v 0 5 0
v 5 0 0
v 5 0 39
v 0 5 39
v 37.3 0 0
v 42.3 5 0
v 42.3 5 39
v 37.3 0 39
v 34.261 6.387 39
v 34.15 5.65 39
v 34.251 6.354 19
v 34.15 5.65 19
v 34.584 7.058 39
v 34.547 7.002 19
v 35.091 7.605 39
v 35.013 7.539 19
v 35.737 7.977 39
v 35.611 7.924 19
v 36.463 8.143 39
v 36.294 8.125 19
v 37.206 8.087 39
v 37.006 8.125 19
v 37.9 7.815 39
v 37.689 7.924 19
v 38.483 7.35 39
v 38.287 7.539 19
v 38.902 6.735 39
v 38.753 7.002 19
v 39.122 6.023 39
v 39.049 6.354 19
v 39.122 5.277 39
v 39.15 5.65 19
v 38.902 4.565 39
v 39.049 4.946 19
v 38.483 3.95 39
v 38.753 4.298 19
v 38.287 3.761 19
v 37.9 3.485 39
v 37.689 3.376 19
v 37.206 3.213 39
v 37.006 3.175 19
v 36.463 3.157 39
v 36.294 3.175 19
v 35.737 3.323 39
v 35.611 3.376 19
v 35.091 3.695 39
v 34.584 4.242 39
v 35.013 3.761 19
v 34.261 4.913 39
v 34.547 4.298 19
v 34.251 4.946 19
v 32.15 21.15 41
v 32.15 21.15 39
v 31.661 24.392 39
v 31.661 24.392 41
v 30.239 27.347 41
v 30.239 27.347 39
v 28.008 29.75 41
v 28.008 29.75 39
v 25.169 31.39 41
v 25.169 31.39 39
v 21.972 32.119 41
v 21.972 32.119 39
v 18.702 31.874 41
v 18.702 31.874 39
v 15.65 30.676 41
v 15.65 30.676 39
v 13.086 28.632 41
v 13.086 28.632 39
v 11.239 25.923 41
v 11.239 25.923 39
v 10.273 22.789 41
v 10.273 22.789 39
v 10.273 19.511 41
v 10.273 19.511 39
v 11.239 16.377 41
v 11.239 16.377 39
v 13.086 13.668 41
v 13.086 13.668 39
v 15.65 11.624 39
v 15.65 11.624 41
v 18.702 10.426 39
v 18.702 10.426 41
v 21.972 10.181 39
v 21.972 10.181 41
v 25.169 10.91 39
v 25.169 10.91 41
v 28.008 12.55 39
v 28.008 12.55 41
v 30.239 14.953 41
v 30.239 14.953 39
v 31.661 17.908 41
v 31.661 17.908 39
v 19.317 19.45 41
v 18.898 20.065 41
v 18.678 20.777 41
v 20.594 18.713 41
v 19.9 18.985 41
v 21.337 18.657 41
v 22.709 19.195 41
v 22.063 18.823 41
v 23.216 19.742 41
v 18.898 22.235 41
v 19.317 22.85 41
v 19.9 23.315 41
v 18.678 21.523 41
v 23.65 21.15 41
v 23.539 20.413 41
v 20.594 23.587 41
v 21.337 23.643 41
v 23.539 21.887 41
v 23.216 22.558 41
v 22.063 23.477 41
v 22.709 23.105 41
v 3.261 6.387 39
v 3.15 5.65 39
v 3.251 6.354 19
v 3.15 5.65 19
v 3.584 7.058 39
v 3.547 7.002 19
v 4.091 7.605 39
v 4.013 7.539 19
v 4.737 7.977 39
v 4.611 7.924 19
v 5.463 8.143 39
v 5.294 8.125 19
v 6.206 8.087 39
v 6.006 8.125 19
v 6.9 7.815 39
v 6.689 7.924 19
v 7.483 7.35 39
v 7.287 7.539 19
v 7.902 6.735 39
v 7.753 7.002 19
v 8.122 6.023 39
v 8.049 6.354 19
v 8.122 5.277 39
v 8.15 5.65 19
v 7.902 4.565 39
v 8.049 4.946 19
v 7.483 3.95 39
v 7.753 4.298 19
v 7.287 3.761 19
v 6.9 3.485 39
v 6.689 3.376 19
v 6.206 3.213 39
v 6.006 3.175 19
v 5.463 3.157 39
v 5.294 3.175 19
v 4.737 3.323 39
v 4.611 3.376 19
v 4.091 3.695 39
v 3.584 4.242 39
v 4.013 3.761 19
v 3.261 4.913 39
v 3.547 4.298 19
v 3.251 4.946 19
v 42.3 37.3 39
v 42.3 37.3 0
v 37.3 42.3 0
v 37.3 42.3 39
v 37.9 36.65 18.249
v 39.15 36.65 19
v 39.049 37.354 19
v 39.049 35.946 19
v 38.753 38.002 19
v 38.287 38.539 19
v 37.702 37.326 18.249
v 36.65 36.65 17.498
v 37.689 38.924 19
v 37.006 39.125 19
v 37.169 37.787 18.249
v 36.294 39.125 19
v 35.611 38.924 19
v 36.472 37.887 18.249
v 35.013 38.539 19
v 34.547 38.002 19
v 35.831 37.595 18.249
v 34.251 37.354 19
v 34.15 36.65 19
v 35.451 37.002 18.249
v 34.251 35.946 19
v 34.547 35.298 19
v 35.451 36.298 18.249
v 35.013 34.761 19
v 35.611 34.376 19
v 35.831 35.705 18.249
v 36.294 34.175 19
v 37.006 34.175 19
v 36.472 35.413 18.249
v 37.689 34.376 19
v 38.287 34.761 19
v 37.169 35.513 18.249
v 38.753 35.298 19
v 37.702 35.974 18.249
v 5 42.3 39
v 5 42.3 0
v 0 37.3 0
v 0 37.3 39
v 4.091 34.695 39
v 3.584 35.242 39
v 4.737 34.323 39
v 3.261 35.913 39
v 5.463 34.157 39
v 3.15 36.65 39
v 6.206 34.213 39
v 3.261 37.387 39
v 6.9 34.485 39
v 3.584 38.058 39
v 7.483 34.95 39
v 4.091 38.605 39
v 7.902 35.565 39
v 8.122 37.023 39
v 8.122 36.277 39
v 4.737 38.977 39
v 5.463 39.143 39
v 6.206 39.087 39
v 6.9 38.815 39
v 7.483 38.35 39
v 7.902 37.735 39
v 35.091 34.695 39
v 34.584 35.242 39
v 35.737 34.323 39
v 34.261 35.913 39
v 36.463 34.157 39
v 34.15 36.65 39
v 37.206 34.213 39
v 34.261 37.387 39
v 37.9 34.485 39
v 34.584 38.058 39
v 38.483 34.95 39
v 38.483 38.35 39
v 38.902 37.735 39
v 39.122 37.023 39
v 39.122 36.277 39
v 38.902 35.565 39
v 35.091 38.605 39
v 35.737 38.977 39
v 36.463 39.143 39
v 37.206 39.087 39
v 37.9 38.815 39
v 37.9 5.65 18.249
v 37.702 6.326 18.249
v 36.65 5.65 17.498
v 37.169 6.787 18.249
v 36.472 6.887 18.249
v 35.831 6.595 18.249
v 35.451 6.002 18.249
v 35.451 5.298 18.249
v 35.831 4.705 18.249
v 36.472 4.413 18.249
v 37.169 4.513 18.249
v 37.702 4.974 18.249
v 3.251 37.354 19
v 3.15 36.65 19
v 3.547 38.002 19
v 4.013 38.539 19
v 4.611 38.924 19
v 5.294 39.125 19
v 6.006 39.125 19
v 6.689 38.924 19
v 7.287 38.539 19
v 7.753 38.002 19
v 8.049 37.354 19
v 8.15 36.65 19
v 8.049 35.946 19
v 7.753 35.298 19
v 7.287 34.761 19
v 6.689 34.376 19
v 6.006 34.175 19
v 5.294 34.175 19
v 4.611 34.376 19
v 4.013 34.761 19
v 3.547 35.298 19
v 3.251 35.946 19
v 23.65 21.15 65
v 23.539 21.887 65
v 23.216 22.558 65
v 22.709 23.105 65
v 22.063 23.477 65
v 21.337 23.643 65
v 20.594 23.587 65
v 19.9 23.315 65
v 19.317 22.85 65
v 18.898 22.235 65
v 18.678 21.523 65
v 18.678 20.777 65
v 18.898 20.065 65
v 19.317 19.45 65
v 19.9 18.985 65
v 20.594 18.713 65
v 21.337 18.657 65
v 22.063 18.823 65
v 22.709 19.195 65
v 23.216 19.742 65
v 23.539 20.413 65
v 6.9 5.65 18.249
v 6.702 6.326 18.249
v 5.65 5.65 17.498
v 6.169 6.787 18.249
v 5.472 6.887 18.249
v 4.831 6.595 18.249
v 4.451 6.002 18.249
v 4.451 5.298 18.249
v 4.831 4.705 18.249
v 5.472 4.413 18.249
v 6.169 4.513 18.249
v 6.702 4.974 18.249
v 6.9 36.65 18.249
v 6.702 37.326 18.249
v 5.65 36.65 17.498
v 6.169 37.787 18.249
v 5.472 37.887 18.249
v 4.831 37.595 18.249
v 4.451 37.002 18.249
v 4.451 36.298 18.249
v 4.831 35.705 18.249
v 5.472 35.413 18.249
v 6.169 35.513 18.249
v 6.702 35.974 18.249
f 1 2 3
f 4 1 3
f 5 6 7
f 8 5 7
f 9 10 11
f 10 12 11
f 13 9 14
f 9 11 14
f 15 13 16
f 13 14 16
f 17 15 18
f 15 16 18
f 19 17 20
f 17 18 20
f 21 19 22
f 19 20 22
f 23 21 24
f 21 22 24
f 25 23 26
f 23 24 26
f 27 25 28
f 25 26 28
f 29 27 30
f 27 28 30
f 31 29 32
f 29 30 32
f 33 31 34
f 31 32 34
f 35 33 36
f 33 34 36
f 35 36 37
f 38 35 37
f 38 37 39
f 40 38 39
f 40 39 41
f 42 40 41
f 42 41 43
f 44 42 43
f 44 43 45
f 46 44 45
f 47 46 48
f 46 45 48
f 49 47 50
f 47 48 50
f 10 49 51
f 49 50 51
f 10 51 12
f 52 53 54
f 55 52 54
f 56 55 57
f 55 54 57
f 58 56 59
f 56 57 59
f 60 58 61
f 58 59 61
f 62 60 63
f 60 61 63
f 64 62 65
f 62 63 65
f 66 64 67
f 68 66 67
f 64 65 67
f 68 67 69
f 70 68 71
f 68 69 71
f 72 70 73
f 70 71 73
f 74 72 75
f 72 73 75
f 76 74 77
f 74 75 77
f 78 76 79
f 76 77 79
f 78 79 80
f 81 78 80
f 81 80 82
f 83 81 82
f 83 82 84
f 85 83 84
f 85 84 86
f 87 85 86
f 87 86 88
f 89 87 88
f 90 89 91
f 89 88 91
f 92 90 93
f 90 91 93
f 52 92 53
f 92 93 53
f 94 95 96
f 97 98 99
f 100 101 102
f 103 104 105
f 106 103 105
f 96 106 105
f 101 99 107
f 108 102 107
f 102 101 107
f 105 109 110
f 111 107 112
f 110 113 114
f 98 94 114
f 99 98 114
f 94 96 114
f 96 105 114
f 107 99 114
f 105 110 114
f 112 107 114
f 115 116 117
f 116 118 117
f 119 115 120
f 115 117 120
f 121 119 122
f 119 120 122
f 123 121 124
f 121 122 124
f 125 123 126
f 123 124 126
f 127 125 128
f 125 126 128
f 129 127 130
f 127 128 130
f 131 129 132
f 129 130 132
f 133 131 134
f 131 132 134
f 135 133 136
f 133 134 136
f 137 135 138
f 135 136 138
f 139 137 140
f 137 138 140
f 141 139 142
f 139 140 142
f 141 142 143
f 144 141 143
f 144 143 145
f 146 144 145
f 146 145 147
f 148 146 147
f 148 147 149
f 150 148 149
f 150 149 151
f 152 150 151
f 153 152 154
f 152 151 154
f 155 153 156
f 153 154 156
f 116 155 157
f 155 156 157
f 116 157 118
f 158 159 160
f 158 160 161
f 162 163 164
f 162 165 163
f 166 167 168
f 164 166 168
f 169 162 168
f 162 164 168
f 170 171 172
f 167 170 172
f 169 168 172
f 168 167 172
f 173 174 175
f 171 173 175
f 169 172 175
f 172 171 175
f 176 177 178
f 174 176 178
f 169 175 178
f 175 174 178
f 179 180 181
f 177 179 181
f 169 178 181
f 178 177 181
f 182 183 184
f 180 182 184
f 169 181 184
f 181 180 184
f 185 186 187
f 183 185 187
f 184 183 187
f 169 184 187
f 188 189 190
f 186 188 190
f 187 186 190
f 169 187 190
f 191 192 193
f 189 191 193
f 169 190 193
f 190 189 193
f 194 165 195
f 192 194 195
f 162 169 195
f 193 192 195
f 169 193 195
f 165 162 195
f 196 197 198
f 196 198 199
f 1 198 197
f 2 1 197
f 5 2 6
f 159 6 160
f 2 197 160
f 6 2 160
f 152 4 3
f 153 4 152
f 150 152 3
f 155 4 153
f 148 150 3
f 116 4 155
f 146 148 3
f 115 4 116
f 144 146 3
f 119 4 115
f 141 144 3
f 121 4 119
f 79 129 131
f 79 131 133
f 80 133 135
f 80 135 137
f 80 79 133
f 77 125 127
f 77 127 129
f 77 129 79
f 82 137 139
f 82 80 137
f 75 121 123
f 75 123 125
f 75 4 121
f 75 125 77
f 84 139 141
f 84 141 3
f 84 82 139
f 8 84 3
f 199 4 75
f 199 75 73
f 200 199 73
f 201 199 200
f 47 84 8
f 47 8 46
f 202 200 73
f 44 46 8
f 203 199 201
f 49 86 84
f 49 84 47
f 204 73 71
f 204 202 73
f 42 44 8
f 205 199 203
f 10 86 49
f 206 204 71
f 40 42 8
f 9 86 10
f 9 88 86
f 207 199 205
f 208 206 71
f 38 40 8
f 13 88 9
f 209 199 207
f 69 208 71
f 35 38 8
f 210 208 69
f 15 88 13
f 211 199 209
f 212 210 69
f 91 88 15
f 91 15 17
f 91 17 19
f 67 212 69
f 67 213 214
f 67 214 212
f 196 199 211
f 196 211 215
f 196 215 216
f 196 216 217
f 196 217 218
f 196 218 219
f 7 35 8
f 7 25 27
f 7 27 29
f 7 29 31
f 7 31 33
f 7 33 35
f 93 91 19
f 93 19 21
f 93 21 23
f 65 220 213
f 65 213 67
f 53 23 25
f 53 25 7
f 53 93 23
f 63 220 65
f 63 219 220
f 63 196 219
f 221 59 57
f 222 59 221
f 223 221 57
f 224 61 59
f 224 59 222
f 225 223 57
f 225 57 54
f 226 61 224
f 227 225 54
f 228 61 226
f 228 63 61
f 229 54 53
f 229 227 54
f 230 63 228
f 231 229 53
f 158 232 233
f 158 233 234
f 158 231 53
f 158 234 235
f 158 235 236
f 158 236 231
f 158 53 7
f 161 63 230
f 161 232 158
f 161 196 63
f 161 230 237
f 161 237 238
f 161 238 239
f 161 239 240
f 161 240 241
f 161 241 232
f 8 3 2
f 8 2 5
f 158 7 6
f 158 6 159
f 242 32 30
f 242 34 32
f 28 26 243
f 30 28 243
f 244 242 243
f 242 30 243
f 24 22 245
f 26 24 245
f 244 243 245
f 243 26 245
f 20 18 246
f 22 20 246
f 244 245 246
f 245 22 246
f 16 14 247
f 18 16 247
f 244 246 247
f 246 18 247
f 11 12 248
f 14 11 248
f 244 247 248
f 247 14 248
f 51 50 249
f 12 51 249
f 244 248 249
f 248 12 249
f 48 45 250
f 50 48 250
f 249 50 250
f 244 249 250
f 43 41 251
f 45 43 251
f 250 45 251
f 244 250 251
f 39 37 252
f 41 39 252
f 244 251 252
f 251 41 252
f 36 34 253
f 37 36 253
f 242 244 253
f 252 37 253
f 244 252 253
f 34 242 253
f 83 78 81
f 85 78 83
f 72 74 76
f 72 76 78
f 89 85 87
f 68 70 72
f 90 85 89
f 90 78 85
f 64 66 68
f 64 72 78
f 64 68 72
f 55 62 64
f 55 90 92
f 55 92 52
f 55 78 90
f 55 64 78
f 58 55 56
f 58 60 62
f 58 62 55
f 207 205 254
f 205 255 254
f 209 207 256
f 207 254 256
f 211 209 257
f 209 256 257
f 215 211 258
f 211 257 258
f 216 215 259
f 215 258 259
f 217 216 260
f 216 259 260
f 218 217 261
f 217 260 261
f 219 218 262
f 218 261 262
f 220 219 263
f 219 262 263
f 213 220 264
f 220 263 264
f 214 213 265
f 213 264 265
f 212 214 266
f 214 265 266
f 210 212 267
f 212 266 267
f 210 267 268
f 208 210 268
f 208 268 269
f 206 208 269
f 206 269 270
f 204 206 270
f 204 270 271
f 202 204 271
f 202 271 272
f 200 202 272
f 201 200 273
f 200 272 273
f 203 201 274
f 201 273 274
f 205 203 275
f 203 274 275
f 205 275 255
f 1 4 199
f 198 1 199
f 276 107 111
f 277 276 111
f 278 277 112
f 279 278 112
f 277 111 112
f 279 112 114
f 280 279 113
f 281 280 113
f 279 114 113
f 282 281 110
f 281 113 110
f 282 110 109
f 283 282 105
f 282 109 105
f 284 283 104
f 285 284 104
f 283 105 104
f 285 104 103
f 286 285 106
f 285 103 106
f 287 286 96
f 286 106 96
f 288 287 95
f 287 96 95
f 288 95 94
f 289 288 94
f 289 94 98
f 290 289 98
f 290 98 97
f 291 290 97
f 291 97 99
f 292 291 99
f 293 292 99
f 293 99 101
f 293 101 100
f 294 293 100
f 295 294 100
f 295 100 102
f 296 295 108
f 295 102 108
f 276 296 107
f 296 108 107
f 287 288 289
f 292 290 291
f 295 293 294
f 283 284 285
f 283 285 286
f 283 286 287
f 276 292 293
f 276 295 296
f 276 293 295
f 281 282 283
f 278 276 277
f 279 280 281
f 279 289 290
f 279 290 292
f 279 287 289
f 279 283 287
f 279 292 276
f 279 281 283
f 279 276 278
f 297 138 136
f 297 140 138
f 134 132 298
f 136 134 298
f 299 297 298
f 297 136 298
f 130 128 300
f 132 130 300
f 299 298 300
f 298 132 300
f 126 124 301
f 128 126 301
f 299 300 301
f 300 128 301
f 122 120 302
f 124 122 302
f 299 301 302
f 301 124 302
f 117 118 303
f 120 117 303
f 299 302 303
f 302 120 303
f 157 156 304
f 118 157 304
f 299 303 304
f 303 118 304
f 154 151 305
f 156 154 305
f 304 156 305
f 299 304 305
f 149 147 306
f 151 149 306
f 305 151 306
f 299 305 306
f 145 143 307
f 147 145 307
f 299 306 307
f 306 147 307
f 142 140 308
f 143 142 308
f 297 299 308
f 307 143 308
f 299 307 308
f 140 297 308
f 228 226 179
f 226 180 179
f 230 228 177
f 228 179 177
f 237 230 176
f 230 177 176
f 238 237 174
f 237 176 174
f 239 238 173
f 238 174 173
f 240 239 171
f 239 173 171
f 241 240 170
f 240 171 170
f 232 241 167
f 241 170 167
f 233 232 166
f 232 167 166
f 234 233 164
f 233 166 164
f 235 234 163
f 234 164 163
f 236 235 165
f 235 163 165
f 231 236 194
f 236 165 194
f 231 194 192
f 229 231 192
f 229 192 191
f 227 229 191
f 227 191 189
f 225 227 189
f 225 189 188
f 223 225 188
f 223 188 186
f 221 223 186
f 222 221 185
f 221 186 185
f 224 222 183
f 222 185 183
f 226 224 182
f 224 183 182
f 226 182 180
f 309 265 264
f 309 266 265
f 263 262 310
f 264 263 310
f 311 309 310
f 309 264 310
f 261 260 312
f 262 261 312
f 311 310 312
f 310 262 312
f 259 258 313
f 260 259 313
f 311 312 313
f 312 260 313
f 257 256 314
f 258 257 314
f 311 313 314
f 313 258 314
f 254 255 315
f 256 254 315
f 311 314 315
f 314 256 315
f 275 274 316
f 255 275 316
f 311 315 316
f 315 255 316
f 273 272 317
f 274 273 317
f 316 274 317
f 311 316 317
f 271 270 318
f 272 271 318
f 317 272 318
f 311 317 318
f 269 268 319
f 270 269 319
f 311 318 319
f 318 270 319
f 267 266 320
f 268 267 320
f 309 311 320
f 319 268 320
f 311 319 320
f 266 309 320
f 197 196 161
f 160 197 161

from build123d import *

# Parameters (mm, degrees)
F0_W     = 42.3
F0_H     = 42.3
F1_DEPTH = 39
F2_R     = 11
F3_DEPTH = 2
F4_R     = 2.5
F5_DEPTH = 24
F7_D     = 5
F7_DEPTH = 20
F7_TIP   = 1.5021515476
F8_SIZE  = 5


with BuildPart() as f1:
    # F0 (on Top) → F1 (new body)
    with BuildSketch(Plane.XY):
        with Locations((21.15, 21.15)):
            Rectangle(F0_W, F0_H)
    extrude(amount=F1_DEPTH)

    # F2 (on face) → F3 (join)
    with BuildSketch(Plane.XY.offset(39)):
        with Locations((21.15, 21.15)):
            Circle(F2_R)
    extrude(amount=F3_DEPTH)

    # F7
    with Locations(Plane.XY.offset(39)):
        with Locations((5.65, 36.65), (36.65, 36.65), (36.65, 5.65), (5.65, 5.65)):
            Hole(F7_D / 2, depth=F7_DEPTH)
            with Locations((0, 0, -(F7_DEPTH + F7_TIP / 2))):  # 118° drill point
                Cone(0, F7_D / 2, F7_TIP, mode=Mode.SUBTRACT)

    # F8
    f8_edges = [f1.edges().sort_by_distance(p)[0] for p in [
        (0, 42.3, 19.5),
        (0, 0, 19.5),
        (42.3, 0, 19.5),
        (42.3, 42.3, 19.5),
    ]]
    chamfer(f8_edges, length=F8_SIZE)


with BuildPart() as f5:
    # F4 (on face) → F5 (new body)
    with BuildSketch(Plane.XY.offset(41)):
        with Locations((21.15, 21.15)):
            Circle(F4_R)
    extrude(amount=F5_DEPTH)


solid = Compound([f1.part, f5.part])
